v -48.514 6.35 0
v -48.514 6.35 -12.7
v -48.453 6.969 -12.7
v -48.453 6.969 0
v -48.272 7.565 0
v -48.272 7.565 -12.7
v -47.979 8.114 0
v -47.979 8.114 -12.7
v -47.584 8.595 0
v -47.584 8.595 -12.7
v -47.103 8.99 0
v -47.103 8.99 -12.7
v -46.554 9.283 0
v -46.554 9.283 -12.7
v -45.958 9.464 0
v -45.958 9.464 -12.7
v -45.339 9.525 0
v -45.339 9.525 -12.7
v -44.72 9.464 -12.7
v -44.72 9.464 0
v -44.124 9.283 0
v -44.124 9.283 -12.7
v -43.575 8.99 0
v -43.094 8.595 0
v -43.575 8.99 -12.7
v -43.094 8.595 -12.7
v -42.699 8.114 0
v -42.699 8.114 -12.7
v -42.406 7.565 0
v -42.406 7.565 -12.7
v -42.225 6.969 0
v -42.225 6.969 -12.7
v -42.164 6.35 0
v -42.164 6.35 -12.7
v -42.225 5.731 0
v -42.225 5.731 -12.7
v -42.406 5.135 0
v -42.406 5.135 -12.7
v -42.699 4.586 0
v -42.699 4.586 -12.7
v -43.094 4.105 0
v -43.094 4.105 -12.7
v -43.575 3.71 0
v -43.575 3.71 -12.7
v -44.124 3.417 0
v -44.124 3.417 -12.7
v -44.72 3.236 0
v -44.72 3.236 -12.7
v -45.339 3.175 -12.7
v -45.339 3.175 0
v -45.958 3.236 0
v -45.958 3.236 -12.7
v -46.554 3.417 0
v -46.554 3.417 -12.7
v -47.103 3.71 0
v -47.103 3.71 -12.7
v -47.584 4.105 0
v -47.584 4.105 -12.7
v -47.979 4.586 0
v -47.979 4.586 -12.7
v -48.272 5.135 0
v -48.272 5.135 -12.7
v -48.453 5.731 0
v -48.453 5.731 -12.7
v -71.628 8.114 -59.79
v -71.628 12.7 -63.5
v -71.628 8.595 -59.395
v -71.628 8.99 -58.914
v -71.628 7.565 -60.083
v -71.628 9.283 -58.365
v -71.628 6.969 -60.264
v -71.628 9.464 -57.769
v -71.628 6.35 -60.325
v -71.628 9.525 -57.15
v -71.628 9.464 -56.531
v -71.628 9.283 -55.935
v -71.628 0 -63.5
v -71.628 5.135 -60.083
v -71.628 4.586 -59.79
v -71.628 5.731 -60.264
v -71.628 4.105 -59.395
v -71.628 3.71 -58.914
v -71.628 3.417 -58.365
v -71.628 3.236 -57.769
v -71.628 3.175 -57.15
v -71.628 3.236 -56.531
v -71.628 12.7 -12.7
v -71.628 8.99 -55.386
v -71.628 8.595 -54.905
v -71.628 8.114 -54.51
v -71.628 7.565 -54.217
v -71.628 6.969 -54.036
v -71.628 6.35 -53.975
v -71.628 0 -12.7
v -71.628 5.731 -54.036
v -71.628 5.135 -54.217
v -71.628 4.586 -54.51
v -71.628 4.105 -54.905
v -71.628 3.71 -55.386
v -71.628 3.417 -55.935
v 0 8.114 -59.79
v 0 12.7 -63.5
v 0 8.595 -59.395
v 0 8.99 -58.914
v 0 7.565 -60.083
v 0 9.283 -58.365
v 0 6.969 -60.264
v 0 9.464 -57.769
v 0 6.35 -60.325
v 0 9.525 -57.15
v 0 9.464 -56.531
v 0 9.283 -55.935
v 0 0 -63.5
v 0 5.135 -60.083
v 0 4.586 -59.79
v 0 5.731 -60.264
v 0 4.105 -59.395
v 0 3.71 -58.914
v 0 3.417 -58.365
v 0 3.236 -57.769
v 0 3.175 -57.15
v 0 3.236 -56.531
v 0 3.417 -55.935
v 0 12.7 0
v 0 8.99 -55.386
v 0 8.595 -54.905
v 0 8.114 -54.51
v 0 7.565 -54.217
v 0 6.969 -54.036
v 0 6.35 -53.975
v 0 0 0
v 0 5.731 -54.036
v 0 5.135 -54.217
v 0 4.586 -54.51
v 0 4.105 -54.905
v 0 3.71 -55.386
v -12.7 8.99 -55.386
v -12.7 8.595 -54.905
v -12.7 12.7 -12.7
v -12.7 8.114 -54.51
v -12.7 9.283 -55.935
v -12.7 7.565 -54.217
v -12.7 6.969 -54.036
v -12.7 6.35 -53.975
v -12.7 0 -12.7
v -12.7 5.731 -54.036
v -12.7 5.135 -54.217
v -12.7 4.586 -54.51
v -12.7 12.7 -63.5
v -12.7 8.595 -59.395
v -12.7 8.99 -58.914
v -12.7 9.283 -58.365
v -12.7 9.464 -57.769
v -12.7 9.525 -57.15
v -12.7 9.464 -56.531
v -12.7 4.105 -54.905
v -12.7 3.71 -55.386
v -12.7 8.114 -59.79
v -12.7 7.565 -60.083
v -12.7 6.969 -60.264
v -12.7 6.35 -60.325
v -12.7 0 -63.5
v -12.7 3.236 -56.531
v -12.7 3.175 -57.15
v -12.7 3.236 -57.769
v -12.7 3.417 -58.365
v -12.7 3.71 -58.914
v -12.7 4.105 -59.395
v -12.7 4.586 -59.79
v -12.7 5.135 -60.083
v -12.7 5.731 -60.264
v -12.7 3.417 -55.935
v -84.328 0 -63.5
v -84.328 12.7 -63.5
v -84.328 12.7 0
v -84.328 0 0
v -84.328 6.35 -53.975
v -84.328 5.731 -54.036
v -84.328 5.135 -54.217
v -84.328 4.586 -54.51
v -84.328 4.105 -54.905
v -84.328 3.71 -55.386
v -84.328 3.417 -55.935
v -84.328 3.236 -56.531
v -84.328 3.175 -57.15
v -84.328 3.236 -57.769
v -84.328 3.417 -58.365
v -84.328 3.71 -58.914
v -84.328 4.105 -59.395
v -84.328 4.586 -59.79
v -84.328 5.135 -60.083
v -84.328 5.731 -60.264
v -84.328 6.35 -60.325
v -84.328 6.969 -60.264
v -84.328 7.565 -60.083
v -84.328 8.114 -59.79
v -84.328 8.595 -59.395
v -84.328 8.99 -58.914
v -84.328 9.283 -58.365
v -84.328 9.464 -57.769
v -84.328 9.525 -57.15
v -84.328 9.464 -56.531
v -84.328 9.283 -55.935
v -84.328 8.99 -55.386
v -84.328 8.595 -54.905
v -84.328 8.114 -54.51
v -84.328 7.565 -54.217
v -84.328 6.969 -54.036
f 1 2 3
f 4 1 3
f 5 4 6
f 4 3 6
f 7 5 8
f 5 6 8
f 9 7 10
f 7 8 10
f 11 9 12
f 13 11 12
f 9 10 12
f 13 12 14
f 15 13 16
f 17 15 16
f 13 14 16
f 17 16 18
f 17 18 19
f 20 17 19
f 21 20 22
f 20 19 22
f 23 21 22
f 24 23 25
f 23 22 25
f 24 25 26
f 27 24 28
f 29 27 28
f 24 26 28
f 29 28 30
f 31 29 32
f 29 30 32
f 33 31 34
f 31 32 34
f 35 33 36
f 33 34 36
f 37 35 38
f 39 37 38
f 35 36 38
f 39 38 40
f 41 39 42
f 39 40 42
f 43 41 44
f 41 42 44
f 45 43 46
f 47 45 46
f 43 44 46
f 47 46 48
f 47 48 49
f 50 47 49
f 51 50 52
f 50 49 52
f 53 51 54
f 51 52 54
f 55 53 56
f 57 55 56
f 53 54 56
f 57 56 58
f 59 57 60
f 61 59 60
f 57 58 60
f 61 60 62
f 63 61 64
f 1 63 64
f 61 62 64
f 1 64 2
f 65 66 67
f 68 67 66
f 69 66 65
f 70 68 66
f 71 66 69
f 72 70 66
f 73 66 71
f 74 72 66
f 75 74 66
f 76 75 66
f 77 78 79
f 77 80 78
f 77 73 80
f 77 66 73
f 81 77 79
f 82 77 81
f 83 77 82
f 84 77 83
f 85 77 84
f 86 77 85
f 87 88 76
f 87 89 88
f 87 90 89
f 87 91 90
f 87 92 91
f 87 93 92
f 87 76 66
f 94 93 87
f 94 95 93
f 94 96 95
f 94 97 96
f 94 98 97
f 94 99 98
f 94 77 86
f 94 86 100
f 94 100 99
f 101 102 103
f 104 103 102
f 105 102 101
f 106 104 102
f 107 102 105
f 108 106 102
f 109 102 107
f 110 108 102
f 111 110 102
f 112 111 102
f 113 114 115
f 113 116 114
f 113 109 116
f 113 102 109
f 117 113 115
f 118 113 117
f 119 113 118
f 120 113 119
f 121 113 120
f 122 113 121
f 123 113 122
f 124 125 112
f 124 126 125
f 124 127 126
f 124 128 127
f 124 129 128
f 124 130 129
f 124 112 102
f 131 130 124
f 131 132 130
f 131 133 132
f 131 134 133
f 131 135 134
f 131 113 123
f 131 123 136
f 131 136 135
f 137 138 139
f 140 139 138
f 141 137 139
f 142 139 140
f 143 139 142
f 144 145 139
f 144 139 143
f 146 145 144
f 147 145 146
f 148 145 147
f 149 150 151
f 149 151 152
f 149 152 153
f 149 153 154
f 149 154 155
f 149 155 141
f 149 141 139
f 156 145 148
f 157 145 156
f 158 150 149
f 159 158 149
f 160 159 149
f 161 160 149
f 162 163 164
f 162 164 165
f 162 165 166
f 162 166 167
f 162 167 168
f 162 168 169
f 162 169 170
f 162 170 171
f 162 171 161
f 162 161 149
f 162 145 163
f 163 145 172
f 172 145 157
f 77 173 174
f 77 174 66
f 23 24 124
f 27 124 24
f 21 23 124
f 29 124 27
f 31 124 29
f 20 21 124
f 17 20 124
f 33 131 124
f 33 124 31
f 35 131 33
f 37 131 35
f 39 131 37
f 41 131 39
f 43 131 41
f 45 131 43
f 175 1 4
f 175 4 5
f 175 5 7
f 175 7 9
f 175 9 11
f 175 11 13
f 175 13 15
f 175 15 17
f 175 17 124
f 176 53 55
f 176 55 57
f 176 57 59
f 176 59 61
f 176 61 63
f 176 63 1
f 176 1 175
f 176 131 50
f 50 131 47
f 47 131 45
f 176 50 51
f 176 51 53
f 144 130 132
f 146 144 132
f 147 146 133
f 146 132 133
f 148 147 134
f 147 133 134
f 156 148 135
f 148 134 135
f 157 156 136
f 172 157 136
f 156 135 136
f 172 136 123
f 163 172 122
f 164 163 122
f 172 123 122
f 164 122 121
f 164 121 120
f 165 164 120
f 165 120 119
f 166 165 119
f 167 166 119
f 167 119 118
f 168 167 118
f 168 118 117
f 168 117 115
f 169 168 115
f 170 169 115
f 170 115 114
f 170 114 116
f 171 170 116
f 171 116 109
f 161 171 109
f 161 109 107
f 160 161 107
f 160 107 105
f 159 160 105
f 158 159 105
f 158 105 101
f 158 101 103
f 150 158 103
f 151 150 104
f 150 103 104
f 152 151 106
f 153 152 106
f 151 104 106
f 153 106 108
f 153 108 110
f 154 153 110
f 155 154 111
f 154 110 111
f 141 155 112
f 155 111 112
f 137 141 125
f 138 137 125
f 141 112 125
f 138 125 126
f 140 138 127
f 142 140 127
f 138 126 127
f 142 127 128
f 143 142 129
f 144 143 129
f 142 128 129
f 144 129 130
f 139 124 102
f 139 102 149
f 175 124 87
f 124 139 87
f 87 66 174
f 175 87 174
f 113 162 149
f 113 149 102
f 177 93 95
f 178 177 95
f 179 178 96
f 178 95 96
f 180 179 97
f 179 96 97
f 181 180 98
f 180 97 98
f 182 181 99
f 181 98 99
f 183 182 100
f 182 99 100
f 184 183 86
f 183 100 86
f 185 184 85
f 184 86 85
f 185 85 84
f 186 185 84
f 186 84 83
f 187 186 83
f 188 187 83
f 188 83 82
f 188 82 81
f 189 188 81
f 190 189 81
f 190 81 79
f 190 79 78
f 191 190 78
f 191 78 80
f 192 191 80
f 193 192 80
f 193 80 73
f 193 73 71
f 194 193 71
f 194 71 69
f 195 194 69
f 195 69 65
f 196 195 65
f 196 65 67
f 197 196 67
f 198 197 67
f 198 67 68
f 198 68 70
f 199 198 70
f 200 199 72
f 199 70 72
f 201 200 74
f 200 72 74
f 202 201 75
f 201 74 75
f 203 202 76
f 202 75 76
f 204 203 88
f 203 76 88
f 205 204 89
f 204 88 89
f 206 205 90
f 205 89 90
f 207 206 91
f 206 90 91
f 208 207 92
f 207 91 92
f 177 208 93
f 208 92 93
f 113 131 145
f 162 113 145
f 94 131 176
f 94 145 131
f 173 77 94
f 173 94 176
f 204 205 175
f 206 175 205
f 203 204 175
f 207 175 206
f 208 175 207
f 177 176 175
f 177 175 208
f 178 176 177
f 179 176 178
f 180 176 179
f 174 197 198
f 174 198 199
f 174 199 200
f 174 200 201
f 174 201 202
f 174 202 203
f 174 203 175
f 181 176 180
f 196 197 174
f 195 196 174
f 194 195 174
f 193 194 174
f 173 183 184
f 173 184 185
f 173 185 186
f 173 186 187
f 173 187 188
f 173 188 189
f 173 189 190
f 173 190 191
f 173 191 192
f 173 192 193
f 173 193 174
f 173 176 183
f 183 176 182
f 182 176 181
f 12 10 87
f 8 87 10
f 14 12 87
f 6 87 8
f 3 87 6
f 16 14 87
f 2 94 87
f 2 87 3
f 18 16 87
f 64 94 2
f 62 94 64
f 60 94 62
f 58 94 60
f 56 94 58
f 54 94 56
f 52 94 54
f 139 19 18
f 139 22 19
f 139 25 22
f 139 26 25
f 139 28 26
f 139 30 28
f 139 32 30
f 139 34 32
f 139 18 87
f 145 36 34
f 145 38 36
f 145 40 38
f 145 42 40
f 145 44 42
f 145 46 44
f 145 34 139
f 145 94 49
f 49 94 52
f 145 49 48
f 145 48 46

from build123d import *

# Parameters (mm, degrees)
BOSS_EXTRUDE1_DEPTH = 12.7
CUT_EXTRUDE1_REACH  = 108.324
SKETCH2_R           = 3.175
SKETCH3_R           = 3.175
CUT_EXTRUDE2_DEPTH  = 12.7


with BuildPart() as part:
    # Sketch1 → Boss-Extrude1 (new body)
    with BuildSketch(Plane(origin=(0, 0, 0), x_dir=(1, 0, 0), z_dir=(0, 1, 0))):
        Polygon((0, 0), (-84.328, 0), (-84.328, 63.5), (-71.628, 63.5), (-71.628, 12.7), (-12.7, 12.7), (-12.7, 63.5), (0, 63.5), align=None)
    extrude(amount=BOSS_EXTRUDE1_DEPTH)

    # Cut-Extrude1: up to this face of the body (flat: up to its plane)
    cut_extrude1_end = Plane(part.part.faces().sort_by_distance((-84.328, 6.35, -31.75))[0])
    # Sketch2 → Cut-Extrude1 (cut, up to the picked face)
    with BuildSketch(Plane(origin=(0, 0, 0), x_dir=(0, 0, -1), z_dir=(1, 0, 0)), mode=Mode.PRIVATE) as cut_extrude1_sk1:
        with Locations(Location((57.15, 6.35, 0), (0, 0, 180))):
            Circle(SKETCH2_R)
    cut_extrude1_tool1 = split(extrude(cut_extrude1_sk1.sketch, amount=-CUT_EXTRUDE1_REACH, mode=Mode.PRIVATE), bisect_by=cut_extrude1_end, keep=Keep.BOTH, mode=Mode.PRIVATE)
    add(cut_extrude1_tool1.solids().sort_by(Axis((0, 6.35, -57.15), (-1, 0, 0)))[0], mode=Mode.SUBTRACT)

    # Sketch3 → Cut-Extrude2 (cut)
    with BuildSketch(Plane(origin=(0, 0, -12.7), x_dir=(-1, 0, 0), z_dir=(0, 0, -1))):
        with Locations((45.339, 6.35)):
            Circle(SKETCH3_R)
    extrude(amount=-CUT_EXTRUDE2_DEPTH, mode=Mode.SUBTRACT)


solid = part.part
